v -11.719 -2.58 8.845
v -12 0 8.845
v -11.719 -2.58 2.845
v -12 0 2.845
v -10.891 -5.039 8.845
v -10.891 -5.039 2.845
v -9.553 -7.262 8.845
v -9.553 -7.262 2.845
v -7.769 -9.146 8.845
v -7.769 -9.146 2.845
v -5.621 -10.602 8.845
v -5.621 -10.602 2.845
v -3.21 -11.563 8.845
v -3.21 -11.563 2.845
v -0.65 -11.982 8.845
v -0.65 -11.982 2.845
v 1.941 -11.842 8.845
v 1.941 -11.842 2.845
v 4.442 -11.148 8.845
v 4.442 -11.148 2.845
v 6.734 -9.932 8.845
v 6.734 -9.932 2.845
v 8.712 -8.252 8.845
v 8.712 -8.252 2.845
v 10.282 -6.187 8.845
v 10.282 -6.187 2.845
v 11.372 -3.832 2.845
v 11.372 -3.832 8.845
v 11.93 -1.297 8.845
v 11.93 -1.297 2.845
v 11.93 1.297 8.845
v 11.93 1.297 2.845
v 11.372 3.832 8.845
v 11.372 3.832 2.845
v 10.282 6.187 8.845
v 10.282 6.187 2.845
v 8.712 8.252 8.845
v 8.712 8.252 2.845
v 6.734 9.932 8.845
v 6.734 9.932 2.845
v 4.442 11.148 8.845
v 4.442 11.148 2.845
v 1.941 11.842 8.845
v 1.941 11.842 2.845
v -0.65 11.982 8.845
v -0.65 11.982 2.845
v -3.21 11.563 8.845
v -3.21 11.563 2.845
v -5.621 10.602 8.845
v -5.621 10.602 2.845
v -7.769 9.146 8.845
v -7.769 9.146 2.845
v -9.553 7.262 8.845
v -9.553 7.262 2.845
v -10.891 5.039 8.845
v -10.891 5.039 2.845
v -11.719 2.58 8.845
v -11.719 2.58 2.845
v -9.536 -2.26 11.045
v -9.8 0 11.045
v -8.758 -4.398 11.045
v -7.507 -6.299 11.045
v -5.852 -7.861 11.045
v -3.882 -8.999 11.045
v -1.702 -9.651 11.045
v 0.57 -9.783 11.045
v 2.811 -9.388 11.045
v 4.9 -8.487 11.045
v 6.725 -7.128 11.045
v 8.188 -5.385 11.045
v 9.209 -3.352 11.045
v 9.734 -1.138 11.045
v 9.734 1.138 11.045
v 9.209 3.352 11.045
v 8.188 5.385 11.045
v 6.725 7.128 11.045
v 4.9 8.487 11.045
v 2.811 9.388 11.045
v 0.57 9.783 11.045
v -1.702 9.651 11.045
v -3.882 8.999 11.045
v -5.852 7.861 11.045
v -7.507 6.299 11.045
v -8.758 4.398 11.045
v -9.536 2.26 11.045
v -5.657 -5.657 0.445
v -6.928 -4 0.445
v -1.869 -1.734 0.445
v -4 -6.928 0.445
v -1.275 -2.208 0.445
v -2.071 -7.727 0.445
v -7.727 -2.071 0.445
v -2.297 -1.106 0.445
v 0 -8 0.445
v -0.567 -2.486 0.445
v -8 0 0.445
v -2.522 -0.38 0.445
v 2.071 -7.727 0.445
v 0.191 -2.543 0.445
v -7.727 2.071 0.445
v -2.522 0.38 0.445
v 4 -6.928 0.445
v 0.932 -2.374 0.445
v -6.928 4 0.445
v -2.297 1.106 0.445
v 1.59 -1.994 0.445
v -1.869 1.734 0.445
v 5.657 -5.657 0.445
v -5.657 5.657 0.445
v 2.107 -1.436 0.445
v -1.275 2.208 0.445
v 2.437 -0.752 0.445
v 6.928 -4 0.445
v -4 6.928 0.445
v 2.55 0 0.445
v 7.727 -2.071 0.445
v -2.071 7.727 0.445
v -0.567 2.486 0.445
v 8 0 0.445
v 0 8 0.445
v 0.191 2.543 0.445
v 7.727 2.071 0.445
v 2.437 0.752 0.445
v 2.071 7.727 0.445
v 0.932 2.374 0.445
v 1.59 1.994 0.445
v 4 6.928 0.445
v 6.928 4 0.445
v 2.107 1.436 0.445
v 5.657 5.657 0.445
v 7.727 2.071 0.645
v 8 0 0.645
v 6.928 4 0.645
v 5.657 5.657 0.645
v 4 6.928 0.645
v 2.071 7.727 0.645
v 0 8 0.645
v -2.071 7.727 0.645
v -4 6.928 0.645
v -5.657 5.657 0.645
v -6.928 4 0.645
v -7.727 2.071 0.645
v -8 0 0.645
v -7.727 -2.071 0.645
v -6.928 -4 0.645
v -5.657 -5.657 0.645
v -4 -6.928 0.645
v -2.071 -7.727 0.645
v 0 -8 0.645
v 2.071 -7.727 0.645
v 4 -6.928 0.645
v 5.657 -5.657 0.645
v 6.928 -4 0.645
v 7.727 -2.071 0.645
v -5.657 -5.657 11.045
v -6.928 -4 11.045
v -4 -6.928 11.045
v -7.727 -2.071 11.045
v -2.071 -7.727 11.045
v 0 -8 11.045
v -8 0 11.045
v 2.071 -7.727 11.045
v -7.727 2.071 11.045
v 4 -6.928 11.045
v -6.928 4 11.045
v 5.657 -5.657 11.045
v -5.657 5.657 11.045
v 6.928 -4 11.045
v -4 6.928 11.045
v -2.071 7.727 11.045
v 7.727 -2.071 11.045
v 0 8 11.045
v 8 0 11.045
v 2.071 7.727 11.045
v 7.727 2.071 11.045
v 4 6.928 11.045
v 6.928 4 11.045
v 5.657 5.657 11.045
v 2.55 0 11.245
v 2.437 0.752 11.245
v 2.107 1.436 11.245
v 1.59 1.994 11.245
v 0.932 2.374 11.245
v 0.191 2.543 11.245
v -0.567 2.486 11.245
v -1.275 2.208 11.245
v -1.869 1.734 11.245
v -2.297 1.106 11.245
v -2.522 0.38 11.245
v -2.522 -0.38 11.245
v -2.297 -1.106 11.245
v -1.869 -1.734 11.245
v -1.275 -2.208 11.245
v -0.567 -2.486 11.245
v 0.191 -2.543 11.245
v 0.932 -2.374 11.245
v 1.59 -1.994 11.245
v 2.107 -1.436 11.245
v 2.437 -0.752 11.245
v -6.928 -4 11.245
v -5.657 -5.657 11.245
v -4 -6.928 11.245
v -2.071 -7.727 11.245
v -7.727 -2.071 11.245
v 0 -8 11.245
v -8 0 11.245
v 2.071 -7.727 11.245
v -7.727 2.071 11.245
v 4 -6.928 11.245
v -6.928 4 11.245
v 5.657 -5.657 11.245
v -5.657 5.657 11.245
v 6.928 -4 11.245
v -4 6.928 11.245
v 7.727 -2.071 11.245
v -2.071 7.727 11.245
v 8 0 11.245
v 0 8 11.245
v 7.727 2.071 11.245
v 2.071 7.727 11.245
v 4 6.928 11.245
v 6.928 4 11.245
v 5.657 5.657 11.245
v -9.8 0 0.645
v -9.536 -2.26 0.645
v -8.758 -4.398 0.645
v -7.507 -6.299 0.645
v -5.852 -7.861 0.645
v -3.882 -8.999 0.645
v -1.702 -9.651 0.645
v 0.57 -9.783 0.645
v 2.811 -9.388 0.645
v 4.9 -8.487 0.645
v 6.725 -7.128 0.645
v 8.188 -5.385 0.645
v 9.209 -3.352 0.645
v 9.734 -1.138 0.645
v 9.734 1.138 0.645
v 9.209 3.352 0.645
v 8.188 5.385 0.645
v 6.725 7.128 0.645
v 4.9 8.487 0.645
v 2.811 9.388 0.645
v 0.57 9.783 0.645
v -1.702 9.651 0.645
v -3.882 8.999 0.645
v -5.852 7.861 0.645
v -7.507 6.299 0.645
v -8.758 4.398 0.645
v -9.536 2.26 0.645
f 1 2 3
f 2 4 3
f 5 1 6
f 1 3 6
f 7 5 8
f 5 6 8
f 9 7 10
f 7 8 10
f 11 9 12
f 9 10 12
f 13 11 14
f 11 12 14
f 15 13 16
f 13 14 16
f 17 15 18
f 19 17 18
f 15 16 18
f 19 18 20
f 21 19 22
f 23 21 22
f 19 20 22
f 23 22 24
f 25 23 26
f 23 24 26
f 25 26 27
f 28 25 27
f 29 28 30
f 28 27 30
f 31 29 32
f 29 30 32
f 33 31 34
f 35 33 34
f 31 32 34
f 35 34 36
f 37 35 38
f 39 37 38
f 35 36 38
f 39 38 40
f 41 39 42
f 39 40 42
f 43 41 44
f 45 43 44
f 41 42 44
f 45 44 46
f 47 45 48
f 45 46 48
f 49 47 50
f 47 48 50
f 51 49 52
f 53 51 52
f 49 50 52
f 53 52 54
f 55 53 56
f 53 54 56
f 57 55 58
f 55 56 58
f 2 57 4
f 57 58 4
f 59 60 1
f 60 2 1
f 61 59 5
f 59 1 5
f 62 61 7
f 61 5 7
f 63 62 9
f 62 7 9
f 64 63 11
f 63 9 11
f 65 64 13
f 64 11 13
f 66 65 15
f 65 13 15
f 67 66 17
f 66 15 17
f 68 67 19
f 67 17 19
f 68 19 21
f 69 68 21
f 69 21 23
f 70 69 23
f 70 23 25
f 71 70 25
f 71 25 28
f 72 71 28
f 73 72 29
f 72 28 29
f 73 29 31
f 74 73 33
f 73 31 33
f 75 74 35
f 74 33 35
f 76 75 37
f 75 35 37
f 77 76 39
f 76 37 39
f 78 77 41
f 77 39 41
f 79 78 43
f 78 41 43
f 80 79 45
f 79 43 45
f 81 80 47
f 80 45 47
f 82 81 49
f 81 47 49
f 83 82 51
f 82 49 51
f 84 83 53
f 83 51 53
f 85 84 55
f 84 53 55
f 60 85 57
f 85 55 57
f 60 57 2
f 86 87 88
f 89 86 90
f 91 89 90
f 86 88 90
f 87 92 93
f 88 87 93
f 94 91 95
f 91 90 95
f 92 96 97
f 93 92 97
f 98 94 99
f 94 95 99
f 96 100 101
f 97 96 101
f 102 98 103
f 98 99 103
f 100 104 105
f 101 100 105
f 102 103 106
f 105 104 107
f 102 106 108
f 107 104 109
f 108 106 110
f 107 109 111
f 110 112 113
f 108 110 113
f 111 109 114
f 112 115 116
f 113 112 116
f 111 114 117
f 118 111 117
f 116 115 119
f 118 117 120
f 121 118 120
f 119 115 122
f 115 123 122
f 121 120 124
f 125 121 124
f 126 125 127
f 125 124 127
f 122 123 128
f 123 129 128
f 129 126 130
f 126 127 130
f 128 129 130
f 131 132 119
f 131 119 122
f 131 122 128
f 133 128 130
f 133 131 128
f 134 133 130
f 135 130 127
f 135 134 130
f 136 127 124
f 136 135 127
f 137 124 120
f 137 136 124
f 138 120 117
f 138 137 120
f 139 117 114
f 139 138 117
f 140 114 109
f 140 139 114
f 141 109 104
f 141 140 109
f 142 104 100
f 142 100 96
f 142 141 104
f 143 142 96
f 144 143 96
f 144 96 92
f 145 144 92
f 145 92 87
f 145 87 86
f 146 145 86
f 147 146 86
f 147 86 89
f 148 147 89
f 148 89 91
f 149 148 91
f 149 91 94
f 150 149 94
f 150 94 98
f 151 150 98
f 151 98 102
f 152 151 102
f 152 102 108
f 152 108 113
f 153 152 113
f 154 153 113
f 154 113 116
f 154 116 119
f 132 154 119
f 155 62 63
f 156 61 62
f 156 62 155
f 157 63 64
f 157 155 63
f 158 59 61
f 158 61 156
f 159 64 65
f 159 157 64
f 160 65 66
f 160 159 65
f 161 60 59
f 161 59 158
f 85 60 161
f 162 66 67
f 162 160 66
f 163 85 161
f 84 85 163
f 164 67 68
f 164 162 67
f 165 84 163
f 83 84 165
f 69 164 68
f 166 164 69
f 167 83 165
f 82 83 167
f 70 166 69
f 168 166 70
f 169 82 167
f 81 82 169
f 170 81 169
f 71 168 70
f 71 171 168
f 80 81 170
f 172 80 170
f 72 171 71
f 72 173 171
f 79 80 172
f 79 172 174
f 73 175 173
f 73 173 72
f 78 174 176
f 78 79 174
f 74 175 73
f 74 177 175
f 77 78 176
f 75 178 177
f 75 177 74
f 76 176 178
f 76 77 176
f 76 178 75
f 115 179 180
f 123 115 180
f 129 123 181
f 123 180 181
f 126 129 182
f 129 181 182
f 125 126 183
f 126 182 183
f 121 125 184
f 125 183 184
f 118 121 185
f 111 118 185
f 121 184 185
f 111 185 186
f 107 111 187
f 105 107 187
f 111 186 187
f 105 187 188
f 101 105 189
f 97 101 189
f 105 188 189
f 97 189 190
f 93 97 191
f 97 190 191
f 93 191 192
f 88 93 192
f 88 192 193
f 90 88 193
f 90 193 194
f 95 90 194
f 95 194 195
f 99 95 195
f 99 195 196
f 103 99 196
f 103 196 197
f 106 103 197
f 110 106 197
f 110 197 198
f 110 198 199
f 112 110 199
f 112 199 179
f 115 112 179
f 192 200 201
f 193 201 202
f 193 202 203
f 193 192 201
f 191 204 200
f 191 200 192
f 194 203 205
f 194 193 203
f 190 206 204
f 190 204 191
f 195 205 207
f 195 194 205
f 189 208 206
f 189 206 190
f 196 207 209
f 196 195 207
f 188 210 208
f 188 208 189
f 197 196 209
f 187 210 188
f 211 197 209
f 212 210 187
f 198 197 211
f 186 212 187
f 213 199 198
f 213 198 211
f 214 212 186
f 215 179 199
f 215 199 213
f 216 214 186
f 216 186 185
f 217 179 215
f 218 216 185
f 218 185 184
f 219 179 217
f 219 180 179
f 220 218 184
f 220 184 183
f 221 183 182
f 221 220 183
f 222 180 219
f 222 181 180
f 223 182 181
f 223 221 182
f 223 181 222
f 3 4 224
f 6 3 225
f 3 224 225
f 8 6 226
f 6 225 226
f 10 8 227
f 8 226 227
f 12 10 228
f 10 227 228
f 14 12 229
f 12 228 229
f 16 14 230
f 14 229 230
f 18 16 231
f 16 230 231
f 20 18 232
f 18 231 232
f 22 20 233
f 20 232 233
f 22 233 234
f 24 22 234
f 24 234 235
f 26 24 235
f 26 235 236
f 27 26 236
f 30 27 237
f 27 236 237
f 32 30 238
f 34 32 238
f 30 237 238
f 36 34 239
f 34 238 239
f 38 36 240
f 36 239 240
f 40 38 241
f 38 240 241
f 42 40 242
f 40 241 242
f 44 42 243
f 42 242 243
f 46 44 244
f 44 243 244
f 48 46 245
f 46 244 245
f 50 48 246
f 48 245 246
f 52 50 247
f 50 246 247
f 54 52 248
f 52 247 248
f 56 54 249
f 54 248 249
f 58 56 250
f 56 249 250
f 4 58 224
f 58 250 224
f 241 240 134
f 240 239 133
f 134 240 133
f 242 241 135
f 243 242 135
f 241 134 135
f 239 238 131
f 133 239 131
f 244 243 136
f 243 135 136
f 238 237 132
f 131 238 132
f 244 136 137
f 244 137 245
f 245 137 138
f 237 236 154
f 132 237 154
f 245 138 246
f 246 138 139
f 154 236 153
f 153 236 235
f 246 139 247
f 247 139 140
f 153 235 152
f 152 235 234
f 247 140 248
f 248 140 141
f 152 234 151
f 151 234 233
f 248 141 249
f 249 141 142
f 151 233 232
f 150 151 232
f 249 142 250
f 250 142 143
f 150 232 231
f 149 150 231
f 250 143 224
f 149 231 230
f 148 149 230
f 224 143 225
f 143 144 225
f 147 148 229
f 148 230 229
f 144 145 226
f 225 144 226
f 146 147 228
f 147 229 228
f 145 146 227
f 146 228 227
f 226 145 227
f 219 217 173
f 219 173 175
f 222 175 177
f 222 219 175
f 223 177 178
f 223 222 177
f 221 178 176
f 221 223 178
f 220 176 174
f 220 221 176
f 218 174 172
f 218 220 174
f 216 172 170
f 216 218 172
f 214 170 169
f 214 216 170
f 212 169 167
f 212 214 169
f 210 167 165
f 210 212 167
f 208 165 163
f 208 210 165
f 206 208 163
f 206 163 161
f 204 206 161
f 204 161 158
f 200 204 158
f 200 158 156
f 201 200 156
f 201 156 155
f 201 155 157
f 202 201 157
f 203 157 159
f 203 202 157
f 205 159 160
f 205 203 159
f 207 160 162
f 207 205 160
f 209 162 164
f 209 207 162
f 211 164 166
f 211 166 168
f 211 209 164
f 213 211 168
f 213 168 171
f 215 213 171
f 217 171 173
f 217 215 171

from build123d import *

# Parameters (mm, degrees)
SKETCH2_R           = 8
SKETCH2_R_2         = 2.55
BOSS_EXTRUDE1_DEPTH = 10.6
BOSS_EXTRUDE2_START = 0.2
SKETCH3_R           = 8
SKETCH3_R_2         = 2.55
BOSS_EXTRUDE2_DEPTH = 0.2


with BuildPart() as part:
    # Sketch1 → Revolve1 (revolve)
    with BuildSketch(Plane(origin=(0, 0, 0), x_dir=(0, 0, -1), z_dir=(1, 0, 0)), mode=Mode.PRIVATE) as revolve1_sk:
        Polygon((-0.645132269, 8), (-11.045132269, 8), (-11.045132269, 9.8), (-8.845132269, 12), (-2.845132269, 12), (-0.645132269, 9.8), align=None)
    revolve(revolve1_sk.sketch.rotate(Axis((0, 0, 0), (0, 0, 1)), 90), axis=Axis((0, 0, 0), (0, 0, 1)))

    # Sketch2 → Boss-Extrude1 (add)
    with BuildSketch(Plane.XY.offset(11.045132269)):
        Circle(SKETCH2_R)
        Circle(SKETCH2_R_2, mode=Mode.SUBTRACT)
    extrude(amount=-BOSS_EXTRUDE1_DEPTH)

    # Sketch3 → Boss-Extrude2 (add)
    with BuildSketch(Plane.XY.offset(11.045132269).offset(BOSS_EXTRUDE2_START)):
        Circle(SKETCH3_R)
        Circle(SKETCH3_R_2, mode=Mode.SUBTRACT)
    extrude(amount=-BOSS_EXTRUDE2_DEPTH)


solid = part.part
